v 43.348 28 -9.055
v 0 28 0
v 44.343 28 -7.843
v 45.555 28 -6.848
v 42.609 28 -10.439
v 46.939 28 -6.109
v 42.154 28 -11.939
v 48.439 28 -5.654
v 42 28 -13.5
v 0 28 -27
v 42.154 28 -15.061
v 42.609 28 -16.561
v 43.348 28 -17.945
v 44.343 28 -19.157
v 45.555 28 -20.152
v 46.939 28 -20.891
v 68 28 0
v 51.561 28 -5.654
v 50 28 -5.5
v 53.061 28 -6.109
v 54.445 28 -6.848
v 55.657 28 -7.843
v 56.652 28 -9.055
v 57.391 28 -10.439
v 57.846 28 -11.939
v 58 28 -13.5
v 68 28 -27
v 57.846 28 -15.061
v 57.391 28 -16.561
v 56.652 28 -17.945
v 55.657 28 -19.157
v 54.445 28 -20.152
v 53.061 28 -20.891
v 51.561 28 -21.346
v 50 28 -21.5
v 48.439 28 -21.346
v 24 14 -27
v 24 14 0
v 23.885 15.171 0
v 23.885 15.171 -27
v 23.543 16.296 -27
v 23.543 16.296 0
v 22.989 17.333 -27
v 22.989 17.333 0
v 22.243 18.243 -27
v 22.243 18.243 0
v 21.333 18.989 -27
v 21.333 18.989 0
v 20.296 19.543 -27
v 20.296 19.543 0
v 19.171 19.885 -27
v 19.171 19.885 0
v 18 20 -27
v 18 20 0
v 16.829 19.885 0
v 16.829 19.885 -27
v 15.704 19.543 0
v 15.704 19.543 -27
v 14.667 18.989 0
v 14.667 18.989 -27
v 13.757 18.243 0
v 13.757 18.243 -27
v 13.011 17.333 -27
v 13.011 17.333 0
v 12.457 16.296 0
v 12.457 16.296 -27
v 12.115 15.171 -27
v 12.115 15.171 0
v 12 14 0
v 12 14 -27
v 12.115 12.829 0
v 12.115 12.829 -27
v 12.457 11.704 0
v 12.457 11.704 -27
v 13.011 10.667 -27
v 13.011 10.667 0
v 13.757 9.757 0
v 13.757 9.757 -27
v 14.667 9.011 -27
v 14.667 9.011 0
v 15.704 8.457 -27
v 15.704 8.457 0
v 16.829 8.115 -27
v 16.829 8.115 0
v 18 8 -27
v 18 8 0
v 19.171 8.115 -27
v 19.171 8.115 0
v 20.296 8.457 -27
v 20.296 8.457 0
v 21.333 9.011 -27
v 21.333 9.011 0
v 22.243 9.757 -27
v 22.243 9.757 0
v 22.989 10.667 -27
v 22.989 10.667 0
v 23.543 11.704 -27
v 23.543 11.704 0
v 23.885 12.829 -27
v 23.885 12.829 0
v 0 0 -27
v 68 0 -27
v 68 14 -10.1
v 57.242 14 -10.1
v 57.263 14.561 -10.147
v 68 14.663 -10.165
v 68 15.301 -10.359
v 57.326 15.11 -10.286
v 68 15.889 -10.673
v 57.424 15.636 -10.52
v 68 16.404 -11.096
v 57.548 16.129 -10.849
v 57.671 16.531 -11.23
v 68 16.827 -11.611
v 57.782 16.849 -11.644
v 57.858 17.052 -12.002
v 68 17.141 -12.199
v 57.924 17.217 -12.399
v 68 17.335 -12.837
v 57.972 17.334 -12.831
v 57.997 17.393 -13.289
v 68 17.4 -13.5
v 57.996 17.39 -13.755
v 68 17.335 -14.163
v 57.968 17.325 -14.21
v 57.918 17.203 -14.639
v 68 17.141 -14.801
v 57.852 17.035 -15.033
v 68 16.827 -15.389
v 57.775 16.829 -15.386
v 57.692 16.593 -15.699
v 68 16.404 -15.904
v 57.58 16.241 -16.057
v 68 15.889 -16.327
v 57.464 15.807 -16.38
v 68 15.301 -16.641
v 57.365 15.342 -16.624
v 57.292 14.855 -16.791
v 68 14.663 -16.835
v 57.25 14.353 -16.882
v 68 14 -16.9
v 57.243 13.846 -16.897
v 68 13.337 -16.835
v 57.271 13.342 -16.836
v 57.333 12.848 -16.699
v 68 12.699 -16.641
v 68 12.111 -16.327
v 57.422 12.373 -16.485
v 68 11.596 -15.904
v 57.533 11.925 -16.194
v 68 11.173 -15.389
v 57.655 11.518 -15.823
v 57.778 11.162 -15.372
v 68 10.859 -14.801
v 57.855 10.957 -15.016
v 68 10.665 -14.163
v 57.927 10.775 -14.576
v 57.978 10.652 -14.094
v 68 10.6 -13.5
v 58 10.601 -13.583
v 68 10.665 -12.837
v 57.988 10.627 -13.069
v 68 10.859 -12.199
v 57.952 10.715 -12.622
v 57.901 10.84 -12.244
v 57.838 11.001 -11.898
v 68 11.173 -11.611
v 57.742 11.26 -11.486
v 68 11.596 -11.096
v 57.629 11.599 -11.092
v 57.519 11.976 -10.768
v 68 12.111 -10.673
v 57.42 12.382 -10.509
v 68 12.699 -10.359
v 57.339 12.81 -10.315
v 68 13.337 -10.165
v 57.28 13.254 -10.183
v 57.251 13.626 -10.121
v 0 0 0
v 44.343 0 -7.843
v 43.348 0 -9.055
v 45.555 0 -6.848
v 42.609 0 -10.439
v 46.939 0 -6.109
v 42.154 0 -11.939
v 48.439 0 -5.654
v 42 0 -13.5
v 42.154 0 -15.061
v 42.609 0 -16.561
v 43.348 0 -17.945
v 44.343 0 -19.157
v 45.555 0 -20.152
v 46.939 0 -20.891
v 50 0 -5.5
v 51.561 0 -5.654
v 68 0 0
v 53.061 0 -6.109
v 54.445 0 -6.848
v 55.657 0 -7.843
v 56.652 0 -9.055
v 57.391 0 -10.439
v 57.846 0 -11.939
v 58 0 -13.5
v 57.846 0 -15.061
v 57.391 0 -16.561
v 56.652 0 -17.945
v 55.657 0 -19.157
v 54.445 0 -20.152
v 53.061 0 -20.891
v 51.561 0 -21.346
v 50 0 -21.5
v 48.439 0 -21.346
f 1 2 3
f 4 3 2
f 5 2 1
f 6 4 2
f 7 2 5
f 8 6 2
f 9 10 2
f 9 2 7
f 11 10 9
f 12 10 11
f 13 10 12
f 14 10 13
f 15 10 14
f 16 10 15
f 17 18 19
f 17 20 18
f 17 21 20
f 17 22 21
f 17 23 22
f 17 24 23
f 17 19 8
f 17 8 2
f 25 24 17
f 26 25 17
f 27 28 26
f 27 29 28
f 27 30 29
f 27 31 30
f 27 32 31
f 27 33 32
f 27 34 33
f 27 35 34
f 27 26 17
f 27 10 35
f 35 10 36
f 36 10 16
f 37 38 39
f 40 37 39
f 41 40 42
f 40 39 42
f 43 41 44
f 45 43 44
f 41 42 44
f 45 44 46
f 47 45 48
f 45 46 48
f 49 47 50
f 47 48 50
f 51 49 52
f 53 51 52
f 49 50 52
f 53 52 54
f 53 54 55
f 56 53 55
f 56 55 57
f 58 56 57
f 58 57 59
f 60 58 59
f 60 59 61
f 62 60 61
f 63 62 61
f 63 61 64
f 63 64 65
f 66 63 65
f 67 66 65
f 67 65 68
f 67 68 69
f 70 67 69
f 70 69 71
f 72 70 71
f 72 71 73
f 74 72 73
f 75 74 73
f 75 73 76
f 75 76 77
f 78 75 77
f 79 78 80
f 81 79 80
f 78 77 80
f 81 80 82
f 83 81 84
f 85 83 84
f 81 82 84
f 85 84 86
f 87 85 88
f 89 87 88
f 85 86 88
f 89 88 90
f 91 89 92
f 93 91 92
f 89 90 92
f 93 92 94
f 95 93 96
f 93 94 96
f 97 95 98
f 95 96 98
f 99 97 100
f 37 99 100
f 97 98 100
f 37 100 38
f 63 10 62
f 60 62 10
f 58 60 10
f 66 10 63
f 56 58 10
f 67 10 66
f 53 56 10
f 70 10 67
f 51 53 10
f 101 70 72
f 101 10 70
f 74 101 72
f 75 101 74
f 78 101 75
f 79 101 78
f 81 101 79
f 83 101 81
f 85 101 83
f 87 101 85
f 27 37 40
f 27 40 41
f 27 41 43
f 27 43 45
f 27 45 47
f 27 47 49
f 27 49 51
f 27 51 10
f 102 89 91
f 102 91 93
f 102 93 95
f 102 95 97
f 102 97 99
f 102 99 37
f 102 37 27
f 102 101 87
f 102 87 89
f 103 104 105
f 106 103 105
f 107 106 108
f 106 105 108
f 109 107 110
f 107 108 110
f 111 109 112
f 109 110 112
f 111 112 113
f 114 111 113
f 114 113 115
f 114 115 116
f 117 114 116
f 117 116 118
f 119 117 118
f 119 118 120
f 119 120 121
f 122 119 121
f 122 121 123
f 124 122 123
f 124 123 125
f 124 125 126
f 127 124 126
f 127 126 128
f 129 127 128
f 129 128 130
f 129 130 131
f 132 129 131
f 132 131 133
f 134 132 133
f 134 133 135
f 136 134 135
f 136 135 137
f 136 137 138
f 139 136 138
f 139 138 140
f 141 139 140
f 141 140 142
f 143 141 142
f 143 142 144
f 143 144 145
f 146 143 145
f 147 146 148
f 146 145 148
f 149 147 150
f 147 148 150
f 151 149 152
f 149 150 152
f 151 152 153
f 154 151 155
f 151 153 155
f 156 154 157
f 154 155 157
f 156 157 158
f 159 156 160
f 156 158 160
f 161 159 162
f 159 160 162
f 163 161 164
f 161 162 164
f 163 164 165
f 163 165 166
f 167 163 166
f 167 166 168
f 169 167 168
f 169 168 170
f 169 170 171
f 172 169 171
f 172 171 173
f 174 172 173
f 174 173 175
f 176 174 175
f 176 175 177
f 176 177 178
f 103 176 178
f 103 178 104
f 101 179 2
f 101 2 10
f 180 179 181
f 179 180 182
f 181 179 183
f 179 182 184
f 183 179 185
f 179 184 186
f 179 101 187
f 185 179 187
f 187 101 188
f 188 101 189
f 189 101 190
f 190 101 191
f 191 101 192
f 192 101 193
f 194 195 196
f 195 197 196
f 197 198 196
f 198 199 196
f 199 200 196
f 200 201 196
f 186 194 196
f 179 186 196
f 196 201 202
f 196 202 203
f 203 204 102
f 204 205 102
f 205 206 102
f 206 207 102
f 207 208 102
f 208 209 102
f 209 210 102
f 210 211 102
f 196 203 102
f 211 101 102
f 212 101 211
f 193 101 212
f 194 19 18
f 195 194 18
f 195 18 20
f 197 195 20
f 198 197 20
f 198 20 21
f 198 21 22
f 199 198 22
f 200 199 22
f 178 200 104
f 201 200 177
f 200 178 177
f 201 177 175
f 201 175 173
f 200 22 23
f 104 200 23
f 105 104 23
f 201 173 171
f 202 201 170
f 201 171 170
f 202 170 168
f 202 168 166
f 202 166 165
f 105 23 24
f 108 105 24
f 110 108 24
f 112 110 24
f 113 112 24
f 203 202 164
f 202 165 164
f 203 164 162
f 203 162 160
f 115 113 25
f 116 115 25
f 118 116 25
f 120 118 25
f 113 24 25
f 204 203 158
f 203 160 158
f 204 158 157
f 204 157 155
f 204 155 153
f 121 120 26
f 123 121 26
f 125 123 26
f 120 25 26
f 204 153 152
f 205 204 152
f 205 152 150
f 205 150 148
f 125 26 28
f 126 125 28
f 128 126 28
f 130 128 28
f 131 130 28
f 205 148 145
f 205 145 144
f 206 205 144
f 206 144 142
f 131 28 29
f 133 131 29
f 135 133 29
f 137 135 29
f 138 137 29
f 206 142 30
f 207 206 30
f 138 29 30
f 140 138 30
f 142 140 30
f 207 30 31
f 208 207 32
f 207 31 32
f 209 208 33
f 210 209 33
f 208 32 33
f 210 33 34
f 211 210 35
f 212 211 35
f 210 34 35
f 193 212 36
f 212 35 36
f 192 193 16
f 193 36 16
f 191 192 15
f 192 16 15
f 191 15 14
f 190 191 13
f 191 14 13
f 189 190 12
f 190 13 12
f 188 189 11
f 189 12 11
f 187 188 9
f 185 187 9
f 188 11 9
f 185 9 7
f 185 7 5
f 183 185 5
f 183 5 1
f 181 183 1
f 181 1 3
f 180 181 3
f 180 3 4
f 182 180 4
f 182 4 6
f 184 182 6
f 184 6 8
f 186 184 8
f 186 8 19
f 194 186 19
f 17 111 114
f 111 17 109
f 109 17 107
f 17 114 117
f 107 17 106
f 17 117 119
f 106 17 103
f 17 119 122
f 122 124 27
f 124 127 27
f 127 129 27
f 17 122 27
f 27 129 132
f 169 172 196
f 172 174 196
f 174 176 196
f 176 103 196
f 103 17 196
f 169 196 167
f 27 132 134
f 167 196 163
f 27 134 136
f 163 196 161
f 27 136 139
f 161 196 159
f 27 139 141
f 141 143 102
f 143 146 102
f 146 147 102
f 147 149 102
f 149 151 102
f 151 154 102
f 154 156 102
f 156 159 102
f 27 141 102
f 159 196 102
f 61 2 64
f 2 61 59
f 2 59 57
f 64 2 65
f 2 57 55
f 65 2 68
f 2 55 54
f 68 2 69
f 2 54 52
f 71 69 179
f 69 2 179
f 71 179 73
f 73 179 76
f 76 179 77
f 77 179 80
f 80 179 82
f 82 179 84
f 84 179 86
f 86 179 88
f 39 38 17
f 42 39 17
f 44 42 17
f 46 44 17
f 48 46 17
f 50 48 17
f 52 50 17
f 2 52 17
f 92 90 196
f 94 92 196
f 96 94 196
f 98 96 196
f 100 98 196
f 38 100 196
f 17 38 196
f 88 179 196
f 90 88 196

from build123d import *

# Parameters (mm, degrees)
SKETCH1_W             = 68
SKETCH1_H             = 27
BOSS_EXTRUDE1_DEPTH   = 28
SKETCH2_R             = 6
CUT_EXTRUDE1_DEPTH    = 28
SKETCH3_R             = 8
CUT_EXTRUDE2_DEPTH    = 28
M8_TAPPED_HOLE1_D     = 6.8
M8_TAPPED_HOLE1_DEPTH = 15


with BuildPart() as part:
    # Sketch1 → Boss-Extrude1 (new body)
    with BuildSketch(Plane(origin=(0, 0, 0), x_dir=(1, 0, 0), z_dir=(0, 1, 0))):
        with Locations((34, 13.5)):
            Rectangle(SKETCH1_W, SKETCH1_H)
    extrude(amount=BOSS_EXTRUDE1_DEPTH)

    # Sketch2 → Cut-Extrude1 (cut)
    with BuildSketch(Plane.XY):
        with Locations((18, 14)):
            Circle(SKETCH2_R)
    extrude(amount=-CUT_EXTRUDE1_DEPTH, mode=Mode.SUBTRACT)

    # Sketch3 → Cut-Extrude2 (cut)
    with BuildSketch(Plane(origin=(0, 28, 0), x_dir=(1, 0, 0), z_dir=(0, 1, 0))):
        with Locations(Location((50, 13.5, 0), (0, 0, 270))):
            Circle(SKETCH3_R)
    extrude(amount=-CUT_EXTRUDE2_DEPTH, mode=Mode.SUBTRACT)

    # M8 Tapped Hole1
    with Locations(Plane(origin=(68, 0, 0), x_dir=(0, 0, -1), z_dir=(1, 0, 0))):
        with Locations((13.5, 14)):
            Hole(M8_TAPPED_HOLE1_D / 2, depth=M8_TAPPED_HOLE1_DEPTH)


solid = part.part
